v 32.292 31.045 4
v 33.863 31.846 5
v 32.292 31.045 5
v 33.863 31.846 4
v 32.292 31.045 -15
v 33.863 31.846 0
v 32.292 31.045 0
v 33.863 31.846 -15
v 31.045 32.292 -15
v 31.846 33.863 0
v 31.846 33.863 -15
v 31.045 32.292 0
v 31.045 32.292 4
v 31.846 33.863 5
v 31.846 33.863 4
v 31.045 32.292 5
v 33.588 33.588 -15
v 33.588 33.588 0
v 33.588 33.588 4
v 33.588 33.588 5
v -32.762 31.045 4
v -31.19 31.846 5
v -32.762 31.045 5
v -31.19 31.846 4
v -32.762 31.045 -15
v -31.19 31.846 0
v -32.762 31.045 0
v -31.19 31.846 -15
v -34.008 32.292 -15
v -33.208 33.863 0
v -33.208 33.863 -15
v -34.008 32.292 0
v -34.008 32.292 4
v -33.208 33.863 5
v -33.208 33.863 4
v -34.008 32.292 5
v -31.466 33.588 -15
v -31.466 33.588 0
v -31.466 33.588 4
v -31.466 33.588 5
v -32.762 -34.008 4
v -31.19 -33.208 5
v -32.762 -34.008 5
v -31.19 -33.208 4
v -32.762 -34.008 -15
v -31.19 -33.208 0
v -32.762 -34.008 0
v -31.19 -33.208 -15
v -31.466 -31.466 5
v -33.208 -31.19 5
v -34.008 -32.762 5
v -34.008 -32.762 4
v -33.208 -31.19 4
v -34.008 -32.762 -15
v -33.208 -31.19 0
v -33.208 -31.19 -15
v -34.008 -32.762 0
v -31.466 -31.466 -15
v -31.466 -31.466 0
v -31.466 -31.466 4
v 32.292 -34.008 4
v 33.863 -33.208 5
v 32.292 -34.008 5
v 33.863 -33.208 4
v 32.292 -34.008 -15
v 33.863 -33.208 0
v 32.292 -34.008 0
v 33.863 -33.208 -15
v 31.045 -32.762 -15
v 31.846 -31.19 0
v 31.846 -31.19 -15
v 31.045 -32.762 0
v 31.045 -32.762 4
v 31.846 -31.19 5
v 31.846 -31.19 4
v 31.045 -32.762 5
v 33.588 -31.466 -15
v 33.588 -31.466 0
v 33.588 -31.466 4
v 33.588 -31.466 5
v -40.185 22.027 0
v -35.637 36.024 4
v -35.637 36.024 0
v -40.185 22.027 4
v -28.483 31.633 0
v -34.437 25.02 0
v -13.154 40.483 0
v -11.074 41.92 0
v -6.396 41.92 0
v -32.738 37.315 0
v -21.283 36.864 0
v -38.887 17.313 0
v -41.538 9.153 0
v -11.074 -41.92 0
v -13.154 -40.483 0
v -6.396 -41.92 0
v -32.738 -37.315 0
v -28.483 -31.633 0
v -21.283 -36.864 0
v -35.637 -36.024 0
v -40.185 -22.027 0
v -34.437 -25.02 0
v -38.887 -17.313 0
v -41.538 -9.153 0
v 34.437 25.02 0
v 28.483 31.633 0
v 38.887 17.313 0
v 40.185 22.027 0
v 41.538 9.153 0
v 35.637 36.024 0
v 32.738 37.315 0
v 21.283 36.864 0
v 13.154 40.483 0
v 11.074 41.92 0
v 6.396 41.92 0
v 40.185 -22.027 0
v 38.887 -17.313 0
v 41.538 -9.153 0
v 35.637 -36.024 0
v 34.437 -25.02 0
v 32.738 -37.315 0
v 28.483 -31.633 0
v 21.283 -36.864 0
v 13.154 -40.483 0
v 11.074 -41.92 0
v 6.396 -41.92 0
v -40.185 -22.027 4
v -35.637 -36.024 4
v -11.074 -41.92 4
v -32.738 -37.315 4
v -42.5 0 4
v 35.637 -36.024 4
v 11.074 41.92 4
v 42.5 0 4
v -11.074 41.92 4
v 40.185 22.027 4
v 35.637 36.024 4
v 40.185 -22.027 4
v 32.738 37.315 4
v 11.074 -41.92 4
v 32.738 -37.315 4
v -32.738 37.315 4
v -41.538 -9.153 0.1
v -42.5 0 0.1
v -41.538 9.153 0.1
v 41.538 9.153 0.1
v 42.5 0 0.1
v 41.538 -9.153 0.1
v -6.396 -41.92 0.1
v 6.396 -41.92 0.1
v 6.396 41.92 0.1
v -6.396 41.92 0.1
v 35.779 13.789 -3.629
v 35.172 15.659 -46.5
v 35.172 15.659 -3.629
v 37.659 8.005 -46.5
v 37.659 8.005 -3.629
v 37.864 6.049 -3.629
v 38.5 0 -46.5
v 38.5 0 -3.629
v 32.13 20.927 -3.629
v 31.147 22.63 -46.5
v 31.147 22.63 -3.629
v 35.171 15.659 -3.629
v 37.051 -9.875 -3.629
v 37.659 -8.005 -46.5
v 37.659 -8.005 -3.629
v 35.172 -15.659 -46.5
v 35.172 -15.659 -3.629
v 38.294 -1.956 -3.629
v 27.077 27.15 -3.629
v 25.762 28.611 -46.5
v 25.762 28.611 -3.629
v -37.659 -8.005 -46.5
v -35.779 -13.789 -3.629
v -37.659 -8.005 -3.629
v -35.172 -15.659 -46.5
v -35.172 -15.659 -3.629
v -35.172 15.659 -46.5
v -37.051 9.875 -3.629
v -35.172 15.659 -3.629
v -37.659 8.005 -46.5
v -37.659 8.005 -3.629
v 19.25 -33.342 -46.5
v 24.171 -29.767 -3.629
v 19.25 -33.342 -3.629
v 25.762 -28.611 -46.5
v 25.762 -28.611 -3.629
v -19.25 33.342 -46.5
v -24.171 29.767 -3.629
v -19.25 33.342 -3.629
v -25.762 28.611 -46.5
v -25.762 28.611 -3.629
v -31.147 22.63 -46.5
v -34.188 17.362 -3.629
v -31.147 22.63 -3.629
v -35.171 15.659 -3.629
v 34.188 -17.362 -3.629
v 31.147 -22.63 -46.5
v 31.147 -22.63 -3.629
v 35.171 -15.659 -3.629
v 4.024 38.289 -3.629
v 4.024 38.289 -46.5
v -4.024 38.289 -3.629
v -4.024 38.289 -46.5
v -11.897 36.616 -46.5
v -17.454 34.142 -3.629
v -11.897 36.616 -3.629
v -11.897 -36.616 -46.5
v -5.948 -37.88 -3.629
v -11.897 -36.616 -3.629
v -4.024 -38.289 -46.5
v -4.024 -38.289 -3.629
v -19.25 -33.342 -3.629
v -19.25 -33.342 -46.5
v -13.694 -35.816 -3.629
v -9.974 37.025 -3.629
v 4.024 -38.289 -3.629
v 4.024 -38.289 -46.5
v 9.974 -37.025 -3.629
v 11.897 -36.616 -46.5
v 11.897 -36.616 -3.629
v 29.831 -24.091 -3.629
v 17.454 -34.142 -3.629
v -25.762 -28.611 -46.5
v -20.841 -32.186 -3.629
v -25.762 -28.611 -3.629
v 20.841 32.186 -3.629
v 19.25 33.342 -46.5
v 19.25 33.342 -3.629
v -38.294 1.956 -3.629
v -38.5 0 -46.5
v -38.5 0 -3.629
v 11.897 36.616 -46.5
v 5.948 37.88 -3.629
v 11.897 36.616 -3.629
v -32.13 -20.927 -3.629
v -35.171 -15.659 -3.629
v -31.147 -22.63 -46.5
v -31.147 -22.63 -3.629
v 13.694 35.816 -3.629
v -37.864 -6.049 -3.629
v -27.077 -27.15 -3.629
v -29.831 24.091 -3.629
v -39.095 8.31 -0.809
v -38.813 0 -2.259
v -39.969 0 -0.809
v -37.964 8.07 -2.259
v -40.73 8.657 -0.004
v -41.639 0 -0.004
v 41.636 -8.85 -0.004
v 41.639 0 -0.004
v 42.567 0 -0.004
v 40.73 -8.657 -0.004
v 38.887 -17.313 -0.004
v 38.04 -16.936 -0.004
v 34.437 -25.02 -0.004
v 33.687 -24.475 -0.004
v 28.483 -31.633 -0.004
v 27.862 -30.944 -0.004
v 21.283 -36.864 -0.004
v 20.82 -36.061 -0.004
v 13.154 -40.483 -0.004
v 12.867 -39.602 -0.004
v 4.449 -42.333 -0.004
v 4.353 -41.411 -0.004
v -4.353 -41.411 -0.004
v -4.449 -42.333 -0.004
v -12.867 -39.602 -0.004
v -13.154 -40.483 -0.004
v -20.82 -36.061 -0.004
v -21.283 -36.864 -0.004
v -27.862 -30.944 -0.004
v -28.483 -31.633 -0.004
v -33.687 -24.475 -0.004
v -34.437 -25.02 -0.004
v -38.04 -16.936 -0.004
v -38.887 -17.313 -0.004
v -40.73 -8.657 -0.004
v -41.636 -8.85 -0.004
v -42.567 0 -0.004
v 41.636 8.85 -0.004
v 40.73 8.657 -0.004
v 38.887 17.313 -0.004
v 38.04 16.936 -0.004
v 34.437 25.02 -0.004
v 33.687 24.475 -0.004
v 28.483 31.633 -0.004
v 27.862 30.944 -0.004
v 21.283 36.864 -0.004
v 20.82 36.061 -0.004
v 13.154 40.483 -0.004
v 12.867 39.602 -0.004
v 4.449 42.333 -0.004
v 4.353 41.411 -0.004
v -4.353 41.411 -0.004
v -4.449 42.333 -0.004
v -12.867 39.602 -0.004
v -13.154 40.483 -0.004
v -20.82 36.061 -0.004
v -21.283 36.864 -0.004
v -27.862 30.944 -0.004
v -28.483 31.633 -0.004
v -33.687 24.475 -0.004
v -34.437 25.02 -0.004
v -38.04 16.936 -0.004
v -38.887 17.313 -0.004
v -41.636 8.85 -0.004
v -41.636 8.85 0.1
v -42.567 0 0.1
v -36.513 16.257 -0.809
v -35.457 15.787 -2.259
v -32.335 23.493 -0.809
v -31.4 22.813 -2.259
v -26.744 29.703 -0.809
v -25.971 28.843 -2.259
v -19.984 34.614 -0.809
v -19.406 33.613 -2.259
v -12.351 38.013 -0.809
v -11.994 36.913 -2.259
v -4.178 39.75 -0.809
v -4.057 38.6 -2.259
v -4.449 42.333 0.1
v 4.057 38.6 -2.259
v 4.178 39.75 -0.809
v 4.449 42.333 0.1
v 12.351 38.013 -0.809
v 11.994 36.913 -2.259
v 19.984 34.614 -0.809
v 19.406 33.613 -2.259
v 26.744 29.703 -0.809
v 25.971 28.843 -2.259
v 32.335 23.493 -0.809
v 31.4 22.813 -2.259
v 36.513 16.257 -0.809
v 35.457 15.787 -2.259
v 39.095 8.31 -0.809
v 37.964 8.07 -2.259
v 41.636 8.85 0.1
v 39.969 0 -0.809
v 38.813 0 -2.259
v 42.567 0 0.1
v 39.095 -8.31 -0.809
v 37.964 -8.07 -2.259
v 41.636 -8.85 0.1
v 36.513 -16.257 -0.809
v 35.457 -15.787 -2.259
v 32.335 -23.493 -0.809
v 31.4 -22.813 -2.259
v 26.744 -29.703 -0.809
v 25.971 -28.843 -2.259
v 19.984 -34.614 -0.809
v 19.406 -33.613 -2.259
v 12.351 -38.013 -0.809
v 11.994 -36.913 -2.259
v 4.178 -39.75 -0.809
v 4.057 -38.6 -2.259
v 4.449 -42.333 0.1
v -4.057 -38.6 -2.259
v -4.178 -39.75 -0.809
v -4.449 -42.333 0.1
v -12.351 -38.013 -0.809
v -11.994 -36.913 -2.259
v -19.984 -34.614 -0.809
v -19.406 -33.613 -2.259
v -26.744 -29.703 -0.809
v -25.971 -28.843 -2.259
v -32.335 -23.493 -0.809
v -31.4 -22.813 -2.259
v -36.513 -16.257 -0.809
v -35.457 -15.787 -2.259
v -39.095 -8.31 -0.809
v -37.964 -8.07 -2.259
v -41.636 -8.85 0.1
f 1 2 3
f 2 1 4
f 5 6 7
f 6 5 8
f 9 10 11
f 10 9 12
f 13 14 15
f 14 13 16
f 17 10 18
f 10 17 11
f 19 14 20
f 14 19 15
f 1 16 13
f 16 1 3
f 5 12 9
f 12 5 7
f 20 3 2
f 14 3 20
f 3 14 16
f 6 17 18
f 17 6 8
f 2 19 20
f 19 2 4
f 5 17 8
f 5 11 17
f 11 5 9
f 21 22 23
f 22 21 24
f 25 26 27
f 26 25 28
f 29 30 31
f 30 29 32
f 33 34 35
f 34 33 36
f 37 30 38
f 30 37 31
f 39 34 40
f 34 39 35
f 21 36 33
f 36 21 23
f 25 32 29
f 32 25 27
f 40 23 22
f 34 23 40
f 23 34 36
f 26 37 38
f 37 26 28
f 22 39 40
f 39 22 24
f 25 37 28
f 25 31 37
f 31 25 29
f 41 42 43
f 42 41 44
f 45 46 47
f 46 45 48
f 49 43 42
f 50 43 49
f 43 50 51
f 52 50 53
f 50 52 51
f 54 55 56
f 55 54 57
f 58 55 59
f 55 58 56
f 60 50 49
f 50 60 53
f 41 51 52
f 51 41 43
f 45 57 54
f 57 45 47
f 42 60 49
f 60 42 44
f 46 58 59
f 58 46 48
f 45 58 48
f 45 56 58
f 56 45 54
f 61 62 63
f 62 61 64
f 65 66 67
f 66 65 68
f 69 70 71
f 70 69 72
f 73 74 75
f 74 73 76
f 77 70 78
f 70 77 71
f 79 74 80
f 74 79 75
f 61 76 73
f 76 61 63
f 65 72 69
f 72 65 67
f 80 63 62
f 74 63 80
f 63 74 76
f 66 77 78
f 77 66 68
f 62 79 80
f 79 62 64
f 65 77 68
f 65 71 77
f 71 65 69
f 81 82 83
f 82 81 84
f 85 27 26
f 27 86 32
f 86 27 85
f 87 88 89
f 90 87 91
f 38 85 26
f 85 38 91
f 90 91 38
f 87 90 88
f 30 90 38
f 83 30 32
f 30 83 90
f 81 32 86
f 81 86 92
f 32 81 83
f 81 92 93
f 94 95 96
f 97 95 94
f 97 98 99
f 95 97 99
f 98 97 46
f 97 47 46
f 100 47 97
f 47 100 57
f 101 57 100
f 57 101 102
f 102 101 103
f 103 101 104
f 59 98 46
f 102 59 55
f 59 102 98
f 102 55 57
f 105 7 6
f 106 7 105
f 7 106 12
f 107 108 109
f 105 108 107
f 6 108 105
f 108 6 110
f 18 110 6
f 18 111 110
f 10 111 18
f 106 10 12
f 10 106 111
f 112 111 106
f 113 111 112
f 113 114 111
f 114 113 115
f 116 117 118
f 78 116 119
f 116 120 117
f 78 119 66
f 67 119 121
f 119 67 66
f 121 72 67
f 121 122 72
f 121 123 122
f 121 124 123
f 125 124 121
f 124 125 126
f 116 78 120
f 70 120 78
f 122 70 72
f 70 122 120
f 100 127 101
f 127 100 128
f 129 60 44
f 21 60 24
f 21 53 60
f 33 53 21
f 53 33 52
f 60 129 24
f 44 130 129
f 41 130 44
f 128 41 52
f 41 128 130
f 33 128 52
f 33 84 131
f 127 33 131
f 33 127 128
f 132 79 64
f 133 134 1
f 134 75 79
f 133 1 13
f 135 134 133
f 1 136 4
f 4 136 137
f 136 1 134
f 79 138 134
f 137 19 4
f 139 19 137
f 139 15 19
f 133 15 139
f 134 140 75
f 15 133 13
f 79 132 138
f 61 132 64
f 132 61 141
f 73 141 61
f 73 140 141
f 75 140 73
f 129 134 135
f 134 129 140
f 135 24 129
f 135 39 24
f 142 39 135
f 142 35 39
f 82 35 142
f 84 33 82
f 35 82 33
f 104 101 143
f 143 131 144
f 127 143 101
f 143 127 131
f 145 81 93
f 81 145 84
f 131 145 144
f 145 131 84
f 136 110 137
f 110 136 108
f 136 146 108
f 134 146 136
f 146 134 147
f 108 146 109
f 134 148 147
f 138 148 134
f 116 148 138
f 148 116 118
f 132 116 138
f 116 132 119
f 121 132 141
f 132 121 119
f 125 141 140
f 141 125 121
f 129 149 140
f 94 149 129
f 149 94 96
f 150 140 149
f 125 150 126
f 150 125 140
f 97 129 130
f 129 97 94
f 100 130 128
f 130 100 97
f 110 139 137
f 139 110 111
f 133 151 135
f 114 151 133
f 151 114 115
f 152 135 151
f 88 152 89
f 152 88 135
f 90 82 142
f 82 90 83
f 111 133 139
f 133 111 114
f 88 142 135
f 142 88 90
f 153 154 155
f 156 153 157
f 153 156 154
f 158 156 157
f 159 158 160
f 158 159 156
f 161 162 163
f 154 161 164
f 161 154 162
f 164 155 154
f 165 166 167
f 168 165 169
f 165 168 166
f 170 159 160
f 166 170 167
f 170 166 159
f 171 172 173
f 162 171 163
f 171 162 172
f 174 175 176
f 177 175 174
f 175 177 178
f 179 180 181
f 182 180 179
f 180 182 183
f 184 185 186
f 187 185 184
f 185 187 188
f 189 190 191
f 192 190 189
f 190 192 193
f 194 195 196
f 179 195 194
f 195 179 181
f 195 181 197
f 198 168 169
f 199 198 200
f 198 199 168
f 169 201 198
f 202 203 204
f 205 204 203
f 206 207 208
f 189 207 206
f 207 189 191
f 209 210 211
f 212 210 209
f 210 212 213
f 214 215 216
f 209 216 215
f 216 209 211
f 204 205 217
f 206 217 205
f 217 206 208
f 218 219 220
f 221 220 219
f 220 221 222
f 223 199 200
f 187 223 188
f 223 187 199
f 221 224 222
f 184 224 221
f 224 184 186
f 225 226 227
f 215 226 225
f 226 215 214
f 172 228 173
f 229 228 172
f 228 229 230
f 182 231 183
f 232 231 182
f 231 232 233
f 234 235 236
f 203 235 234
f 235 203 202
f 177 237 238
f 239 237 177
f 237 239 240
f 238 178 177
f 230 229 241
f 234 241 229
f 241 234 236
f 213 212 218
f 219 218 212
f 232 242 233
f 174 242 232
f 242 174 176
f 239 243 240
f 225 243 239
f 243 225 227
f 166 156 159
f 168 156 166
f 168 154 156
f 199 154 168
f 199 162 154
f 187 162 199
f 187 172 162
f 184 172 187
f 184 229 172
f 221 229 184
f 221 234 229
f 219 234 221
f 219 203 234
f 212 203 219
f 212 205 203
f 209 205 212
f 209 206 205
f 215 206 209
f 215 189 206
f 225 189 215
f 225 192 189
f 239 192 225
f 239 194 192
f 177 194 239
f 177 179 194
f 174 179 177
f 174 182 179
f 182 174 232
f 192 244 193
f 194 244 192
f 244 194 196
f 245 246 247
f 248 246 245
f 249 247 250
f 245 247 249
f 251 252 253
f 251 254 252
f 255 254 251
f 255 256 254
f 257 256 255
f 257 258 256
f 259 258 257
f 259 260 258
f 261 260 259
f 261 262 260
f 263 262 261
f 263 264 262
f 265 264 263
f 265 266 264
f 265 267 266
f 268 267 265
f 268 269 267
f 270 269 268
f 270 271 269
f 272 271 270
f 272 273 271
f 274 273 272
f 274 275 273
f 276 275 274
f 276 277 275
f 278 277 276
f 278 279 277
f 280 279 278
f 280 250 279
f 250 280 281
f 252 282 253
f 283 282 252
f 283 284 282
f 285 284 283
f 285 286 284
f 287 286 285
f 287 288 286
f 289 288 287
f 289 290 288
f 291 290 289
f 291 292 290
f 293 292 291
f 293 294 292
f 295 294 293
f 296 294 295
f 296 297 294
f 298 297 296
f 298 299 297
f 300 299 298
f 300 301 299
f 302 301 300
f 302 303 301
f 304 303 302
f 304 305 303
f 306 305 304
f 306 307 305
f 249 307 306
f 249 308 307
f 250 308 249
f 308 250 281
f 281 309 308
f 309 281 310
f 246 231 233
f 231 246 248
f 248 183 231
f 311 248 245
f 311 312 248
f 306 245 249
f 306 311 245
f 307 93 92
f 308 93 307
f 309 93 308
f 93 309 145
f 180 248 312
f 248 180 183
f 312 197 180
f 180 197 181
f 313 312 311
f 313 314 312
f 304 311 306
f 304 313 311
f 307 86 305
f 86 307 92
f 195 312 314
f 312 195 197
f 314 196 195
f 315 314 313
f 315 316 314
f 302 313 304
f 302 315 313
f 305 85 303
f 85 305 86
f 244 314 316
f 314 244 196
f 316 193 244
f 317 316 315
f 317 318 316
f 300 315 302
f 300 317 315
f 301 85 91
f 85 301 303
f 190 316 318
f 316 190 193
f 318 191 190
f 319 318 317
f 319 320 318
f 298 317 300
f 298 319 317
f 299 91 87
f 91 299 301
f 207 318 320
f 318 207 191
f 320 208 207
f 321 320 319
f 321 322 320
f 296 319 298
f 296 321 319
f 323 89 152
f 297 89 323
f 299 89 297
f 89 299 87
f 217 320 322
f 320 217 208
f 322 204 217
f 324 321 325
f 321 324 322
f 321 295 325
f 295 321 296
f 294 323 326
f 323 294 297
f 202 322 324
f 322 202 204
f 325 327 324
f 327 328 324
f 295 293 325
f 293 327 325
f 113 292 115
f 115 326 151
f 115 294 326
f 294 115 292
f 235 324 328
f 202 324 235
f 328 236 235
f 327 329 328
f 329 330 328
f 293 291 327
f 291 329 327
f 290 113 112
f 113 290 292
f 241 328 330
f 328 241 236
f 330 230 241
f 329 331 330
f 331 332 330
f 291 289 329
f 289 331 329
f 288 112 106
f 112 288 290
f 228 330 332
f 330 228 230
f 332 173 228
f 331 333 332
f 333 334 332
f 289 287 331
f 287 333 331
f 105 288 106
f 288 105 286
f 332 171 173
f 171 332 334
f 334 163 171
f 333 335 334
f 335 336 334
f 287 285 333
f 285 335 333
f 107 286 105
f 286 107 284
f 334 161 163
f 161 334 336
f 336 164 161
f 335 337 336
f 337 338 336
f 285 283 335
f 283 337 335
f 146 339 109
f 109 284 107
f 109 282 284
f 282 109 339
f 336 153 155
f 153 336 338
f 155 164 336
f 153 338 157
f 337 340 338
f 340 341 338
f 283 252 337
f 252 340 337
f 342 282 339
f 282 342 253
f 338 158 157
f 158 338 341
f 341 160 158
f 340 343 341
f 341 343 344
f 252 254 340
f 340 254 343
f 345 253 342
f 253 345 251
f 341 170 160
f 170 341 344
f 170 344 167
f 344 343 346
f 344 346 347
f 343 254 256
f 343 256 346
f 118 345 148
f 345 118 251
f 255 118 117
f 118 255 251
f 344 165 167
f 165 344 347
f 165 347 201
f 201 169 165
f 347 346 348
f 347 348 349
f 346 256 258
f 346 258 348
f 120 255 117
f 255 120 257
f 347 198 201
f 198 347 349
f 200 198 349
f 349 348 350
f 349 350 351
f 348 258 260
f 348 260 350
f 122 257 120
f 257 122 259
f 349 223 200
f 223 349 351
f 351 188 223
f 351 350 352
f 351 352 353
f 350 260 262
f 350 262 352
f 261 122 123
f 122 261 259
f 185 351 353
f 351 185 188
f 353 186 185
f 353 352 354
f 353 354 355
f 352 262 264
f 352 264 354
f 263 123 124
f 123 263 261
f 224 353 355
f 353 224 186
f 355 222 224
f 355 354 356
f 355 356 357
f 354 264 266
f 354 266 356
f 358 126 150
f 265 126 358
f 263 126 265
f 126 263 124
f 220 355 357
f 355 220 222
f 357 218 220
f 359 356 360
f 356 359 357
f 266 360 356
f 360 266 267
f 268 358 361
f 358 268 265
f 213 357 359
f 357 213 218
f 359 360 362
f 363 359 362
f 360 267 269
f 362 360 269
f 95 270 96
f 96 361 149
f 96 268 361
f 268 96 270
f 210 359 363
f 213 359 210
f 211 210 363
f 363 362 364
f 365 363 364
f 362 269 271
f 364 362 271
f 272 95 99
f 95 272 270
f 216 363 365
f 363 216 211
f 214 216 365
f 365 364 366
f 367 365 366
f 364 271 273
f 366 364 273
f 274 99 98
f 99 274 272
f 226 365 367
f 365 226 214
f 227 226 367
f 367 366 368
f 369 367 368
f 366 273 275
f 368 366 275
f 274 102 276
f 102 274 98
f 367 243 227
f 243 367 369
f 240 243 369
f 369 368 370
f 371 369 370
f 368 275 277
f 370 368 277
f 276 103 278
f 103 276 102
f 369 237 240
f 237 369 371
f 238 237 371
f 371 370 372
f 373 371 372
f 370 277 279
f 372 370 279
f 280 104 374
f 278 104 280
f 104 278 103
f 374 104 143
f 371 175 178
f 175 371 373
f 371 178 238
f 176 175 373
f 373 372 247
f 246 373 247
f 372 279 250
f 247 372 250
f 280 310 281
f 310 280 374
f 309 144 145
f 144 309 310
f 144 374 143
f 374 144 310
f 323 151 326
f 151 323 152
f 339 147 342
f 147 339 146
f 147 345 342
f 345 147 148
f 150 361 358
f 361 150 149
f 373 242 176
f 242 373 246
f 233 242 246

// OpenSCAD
union(){
//$fn = 100;

baffle_cutout_diameter = 77;
driver_depth = 46.5;

bolt_circle_diameter = 92; 
bolt_diameter = 3;
bolt_depth = 15;
bolt_height = 5;

plate_diamter = 101;
plate_height = 4;

roundover_radius = 25/6;

// Driver Coil
translate([0,0,-driver_depth])
    cylinder(driver_depth,d=baffle_cutout_diameter);

// Roundover for baffel cutout
rotate_extrude(angle=360)
    translate([baffle_cutout_diameter/2-0.1,-roundover_radius+0.1,])
        //rotate([0,90,0])
        difference(){
            square(roundover_radius);
            translate([roundover_radius,0,0])
            circle(r=roundover_radius);
        }


rotate([0,0,45])
// Front Mouting Screws
for ( i = [bolt_circle_diameter/2,-bolt_circle_diameter/2]){
    translate([i,0,-bolt_depth])
        cylinder(bolt_depth+bolt_height,d=bolt_diameter);
    translate([0,i,-bolt_depth])
        cylinder(bolt_depth+bolt_height,d=bolt_diameter);
}

// Basic circular plate 
//cylinder(plate_height,d=plate_diamter);



// Rounded Square Mouting Plate
intersection(){
    // Imaginary chord between the left and right tips of the plate
    // 2mm added for margin
    c=sqrt(2*((plate_diamter+2)/2)^2);
    
    // Height of the the plate at the center 
    // 2mm added for margin
    h = 83+2;
    // Distance between the chord and the top of the bow
    a = (h - c)/2;
    // THe radius of the circuit that would intersect with the corners and the tip of the bow
    r = ((c/2)^2 - a^2)/(2*a);
    echo (r);
    
    // How much each circle needs to be translated to intersect 
    y = r-h/2;
    translate([y,0,0])
        cylinder(plate_height,d=r*2);
    translate([-y,0,0])
        cylinder(plate_height,d=r*2);
    translate([0,y,0])
        cylinder(plate_height,d=r*2);
    translate([0,-y,0])
        cylinder(plate_height,d=r*2);
}

}



    
